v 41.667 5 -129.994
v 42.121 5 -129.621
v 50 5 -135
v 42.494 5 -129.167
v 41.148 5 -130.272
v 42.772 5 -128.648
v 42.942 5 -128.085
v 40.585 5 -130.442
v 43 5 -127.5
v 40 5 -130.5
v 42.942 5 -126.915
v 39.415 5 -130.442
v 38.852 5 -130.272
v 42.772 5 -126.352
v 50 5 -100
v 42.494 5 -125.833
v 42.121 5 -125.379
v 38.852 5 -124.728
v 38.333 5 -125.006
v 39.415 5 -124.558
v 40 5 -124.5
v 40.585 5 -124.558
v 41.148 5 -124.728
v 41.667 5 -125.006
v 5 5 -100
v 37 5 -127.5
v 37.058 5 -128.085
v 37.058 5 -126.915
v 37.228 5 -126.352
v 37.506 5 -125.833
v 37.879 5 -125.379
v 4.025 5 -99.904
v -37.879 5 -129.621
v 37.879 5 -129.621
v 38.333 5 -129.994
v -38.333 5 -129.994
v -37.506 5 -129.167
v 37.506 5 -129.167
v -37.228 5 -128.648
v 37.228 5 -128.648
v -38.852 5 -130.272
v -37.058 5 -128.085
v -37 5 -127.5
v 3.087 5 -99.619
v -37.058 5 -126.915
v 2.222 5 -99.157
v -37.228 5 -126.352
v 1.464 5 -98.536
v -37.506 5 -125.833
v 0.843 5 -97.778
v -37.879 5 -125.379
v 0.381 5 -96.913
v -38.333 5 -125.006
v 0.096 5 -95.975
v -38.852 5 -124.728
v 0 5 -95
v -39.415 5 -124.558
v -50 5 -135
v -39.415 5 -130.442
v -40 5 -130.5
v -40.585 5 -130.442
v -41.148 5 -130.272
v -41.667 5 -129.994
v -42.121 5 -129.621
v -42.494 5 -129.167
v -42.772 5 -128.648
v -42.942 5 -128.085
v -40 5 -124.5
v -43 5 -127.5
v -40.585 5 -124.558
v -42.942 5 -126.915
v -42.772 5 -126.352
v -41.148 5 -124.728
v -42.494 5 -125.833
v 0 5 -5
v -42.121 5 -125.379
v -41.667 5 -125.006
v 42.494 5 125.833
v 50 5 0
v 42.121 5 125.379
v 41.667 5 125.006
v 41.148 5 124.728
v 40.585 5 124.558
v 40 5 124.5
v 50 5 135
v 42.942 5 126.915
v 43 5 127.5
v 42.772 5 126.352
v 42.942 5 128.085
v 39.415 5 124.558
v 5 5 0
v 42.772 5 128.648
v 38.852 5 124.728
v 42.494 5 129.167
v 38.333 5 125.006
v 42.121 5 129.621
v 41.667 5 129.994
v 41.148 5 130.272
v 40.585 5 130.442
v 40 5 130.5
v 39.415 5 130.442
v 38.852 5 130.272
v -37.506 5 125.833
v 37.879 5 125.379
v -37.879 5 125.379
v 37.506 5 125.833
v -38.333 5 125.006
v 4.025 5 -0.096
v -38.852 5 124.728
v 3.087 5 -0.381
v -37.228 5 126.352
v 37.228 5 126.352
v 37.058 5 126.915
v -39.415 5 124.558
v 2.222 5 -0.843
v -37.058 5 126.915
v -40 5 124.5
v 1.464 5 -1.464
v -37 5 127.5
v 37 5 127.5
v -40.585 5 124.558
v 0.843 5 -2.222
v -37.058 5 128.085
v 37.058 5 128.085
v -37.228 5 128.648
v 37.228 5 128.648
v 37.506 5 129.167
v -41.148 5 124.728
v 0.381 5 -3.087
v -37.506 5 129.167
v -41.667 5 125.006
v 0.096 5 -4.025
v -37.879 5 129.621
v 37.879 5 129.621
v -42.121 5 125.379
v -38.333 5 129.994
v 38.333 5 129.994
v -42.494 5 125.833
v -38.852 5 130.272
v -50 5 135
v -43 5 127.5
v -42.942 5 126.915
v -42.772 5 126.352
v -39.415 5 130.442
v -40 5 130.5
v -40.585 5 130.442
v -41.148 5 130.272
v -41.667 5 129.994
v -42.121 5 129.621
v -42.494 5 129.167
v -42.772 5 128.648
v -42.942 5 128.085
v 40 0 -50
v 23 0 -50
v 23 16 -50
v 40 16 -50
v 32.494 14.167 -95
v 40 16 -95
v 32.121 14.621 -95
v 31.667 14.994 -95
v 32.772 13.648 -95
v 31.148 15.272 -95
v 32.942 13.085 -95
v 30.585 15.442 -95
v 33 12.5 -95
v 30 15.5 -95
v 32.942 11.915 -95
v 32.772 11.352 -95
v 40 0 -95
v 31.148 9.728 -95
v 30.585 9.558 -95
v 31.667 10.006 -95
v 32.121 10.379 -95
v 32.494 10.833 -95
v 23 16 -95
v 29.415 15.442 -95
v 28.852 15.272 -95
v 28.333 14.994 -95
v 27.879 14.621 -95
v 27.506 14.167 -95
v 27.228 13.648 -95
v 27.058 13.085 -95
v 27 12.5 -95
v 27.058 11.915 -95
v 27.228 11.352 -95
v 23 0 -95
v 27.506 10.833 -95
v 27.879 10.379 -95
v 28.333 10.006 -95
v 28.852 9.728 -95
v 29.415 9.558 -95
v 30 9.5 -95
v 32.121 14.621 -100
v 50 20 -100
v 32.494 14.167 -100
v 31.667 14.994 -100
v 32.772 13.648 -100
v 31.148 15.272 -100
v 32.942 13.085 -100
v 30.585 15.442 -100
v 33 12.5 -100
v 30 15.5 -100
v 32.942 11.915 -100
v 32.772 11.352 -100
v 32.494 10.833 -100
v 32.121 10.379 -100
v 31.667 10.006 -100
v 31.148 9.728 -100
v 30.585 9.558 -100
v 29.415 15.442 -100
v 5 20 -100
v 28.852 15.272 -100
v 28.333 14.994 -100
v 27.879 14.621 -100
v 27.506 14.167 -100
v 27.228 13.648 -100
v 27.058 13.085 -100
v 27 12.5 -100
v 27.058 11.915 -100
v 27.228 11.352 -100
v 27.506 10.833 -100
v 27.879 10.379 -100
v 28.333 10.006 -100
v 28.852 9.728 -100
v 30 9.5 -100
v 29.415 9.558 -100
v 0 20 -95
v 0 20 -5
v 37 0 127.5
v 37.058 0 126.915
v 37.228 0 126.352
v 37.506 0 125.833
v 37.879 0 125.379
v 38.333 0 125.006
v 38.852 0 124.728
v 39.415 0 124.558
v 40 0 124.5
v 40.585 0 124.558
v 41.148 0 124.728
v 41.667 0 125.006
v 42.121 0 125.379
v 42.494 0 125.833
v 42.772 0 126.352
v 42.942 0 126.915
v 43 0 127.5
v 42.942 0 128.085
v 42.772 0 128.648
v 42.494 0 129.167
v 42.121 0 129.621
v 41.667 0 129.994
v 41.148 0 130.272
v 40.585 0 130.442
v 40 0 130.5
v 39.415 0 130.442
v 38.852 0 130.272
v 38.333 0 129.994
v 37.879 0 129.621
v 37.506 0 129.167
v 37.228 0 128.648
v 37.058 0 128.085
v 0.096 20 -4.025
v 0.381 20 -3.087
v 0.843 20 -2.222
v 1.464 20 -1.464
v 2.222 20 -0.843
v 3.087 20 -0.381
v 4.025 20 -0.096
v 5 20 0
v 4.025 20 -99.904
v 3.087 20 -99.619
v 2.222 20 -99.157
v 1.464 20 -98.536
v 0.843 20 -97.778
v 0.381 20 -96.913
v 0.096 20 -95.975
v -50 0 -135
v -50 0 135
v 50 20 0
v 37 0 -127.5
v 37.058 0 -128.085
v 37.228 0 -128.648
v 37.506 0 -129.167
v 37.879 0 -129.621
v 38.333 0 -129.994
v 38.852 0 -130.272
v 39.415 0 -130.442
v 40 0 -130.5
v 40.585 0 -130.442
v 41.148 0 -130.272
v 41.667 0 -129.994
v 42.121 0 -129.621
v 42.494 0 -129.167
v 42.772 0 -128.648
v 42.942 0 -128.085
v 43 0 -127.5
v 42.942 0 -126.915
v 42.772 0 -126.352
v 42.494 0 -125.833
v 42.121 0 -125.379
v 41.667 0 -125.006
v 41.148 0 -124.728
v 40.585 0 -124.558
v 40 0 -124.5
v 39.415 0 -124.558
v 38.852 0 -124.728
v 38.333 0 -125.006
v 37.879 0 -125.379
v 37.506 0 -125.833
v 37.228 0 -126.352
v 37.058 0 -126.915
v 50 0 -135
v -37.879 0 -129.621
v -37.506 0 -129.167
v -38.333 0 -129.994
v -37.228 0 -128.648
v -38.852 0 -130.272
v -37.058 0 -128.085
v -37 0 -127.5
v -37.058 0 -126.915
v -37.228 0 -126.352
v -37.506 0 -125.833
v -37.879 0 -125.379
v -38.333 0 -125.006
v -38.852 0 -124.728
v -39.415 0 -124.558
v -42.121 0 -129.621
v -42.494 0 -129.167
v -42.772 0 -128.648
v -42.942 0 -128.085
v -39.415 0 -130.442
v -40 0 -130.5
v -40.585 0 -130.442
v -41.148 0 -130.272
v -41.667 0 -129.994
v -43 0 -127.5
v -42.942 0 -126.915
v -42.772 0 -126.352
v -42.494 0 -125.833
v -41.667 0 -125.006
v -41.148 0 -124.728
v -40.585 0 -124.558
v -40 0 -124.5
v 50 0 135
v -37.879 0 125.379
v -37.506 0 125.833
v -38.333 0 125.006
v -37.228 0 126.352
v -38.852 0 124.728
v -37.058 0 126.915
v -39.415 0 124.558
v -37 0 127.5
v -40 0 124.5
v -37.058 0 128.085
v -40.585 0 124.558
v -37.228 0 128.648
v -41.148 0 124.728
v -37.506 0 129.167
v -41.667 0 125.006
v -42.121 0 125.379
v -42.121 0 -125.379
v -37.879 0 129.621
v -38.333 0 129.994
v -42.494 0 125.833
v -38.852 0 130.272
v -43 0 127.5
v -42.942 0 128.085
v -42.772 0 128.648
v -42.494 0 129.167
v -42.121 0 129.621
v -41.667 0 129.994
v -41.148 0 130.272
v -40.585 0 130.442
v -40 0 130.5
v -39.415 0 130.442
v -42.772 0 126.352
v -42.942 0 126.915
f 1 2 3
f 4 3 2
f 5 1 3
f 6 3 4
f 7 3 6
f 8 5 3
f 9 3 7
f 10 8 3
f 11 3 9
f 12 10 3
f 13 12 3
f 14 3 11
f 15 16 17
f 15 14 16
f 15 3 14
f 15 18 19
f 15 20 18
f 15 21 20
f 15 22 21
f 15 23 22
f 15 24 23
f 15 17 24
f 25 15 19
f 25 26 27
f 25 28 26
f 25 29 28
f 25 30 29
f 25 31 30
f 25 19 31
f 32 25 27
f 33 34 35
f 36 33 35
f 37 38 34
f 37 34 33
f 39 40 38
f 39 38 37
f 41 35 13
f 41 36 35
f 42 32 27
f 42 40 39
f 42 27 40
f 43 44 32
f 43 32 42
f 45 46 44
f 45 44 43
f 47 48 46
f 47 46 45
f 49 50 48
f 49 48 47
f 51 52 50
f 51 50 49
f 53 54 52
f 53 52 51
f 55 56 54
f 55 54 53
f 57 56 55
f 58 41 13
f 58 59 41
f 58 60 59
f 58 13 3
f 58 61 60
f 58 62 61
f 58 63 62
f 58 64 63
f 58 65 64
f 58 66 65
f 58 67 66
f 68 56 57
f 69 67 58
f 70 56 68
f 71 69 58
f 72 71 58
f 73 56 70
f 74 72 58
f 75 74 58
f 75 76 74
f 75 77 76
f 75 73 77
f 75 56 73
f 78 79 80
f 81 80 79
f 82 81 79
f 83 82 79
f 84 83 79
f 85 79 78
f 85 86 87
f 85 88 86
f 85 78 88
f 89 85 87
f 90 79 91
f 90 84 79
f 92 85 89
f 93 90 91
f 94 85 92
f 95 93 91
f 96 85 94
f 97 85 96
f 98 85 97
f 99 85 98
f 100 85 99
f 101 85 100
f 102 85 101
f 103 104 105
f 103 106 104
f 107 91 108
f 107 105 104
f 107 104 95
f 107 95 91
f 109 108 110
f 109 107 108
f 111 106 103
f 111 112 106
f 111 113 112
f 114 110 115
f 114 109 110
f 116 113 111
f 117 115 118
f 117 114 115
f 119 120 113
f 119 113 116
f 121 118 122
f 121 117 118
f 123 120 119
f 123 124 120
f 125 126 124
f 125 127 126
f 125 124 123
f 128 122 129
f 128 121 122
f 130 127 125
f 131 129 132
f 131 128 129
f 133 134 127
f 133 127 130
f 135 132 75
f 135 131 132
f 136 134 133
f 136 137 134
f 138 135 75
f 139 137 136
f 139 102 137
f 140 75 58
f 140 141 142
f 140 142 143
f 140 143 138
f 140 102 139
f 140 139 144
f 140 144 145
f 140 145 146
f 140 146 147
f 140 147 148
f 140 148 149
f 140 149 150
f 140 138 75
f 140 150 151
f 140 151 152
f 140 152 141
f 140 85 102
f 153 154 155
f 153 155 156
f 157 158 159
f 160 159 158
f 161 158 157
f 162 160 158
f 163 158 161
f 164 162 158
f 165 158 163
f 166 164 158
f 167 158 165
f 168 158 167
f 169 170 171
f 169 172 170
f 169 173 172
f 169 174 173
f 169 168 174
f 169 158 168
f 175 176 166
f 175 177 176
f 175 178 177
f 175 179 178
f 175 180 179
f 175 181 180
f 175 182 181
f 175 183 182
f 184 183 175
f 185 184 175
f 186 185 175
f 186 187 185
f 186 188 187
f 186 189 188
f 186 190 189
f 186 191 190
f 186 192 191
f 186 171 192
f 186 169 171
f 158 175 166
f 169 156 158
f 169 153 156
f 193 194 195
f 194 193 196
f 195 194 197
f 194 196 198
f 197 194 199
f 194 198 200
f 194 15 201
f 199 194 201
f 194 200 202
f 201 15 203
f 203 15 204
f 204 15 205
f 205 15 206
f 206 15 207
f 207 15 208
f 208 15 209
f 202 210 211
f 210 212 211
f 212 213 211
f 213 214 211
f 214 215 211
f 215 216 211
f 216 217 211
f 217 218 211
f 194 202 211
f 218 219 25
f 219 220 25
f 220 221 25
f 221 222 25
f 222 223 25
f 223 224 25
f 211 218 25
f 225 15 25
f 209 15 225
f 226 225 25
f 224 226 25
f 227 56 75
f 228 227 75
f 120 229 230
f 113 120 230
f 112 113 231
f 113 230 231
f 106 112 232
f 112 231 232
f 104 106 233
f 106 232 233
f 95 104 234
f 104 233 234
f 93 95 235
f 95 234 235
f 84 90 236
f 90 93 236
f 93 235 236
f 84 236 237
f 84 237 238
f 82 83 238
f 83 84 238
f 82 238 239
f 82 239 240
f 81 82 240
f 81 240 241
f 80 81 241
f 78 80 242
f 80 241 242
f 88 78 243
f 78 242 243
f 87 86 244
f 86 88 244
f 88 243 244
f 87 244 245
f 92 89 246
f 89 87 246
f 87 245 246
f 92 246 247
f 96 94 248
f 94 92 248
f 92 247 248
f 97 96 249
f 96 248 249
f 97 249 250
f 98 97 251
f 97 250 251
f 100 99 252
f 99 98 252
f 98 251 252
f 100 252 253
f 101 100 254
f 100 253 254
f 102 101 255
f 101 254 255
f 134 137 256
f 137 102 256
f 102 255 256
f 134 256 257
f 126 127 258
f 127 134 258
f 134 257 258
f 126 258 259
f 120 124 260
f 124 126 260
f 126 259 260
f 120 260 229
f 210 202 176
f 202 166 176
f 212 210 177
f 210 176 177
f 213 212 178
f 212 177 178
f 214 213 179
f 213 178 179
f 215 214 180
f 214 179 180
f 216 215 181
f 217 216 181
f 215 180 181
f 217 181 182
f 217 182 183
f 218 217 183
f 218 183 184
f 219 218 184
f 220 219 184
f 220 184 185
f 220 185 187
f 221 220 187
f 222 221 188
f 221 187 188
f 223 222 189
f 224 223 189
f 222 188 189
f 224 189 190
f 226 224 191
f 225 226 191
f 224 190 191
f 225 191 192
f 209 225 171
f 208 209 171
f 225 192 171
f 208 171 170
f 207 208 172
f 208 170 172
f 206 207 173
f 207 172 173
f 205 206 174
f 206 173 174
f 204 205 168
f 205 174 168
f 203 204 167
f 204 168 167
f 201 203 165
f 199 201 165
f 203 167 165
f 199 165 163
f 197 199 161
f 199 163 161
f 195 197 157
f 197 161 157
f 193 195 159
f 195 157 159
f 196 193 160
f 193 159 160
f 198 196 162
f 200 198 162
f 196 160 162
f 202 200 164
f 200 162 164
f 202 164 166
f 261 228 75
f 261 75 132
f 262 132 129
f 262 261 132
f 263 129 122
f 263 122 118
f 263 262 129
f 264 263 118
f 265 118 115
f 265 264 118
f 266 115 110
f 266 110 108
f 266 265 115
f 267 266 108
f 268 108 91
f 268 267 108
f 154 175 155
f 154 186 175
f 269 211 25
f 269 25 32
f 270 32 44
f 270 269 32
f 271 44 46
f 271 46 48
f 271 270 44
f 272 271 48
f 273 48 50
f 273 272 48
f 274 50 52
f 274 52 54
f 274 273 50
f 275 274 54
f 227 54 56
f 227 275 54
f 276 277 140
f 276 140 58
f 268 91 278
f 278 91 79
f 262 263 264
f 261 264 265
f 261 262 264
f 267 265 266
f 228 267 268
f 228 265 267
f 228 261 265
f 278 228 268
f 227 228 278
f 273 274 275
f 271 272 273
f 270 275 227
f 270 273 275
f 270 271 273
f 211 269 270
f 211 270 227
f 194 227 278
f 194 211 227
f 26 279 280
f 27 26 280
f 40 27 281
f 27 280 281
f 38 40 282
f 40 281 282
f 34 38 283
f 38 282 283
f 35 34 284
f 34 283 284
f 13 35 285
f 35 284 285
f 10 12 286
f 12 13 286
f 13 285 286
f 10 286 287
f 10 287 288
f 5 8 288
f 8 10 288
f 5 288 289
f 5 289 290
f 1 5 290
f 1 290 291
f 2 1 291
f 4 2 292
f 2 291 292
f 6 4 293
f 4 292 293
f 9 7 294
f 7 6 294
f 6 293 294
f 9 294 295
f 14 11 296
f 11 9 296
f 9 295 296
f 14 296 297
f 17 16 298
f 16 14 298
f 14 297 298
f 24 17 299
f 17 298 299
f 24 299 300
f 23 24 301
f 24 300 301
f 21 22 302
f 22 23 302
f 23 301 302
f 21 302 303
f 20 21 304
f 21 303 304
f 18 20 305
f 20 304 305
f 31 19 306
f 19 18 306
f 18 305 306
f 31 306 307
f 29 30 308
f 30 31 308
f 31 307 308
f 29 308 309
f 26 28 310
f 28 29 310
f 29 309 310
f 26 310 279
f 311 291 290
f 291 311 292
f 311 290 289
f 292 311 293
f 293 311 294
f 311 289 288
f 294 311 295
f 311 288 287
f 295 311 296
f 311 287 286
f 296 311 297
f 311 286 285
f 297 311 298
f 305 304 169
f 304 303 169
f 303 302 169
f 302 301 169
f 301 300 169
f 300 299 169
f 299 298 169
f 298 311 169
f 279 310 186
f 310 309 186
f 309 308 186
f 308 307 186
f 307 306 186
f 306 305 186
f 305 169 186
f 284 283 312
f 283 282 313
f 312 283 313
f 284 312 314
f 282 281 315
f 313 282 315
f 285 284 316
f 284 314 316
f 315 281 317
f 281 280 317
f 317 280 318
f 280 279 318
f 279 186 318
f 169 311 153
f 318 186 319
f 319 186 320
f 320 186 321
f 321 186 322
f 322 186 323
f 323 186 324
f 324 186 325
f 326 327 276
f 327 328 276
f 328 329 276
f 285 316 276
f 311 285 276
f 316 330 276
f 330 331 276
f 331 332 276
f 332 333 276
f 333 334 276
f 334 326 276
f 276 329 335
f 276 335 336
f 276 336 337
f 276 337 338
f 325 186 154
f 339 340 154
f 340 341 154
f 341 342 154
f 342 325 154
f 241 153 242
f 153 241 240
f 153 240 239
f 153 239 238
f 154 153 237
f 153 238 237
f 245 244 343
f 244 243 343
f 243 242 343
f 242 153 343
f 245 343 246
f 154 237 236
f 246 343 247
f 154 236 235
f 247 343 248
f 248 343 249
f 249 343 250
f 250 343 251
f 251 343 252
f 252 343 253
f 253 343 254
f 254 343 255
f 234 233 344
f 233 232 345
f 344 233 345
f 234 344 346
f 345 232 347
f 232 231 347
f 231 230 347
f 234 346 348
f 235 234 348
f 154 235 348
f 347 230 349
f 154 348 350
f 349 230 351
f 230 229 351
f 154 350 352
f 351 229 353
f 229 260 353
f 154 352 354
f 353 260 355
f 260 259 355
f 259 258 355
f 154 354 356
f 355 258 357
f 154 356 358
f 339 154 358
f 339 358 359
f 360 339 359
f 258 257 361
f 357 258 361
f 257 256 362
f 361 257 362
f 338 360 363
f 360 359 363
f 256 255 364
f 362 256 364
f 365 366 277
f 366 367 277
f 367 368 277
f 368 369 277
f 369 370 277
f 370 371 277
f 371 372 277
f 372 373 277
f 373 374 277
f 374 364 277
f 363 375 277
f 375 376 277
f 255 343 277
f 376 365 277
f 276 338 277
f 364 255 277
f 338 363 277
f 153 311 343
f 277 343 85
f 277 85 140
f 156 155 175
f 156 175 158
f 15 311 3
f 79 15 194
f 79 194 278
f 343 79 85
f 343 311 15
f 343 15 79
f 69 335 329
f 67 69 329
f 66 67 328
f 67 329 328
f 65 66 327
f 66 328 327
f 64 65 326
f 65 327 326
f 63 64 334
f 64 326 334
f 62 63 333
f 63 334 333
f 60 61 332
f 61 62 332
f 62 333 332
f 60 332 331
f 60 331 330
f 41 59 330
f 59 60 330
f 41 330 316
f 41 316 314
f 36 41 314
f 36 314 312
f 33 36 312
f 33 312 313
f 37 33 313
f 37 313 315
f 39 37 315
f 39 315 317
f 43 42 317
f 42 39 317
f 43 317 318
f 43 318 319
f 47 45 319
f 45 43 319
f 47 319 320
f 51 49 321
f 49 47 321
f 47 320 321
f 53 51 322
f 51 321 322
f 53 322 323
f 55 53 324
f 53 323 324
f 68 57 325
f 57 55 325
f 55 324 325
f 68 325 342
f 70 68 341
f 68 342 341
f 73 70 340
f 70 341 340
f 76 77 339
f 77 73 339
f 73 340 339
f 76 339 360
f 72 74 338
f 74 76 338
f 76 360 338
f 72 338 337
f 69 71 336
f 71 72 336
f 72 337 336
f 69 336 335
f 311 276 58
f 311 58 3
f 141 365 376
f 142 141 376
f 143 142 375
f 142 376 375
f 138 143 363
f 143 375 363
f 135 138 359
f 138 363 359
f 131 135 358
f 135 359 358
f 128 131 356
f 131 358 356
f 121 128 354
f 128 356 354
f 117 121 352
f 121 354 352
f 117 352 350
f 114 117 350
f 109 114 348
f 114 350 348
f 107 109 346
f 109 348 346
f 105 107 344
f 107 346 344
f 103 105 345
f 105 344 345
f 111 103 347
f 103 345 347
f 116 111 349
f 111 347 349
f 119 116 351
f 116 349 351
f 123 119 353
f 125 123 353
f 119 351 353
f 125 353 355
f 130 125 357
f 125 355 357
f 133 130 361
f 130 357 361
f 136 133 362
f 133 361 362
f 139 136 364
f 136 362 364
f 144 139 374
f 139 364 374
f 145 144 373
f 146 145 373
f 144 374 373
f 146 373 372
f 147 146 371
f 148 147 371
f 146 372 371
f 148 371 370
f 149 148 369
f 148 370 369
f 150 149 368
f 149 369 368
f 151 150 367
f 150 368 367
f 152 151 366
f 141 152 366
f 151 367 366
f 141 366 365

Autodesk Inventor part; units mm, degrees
ref_plane "YZ Plane" through (0, 0, 0) normal (1, 0, 0) x (0, 1, 0)
ref_plane "XZ Plane" through (0, 0, 0) normal (0, 1, 0) x (-1, 0, 0)
ref_plane "XY Plane" through (0, 0, 0) normal (0, 0, 1) x (1, 0, 0)
sketch "Sketch1" plane through (0, 0, 0) normal (0, 1, 0) x (-1, 0, 0)
  line L0 (0, 0) -> (0, 135)
  line L1 (0, 135) -> (0, -135)
  line L2 (0, -135) -> (50, -135)
  line L3 (50, -135) -> (-50, -135)
  line L4 (-50, -135) -> (-50, 135)
  line L5 (-50, 135) -> (50, 135)
  line L6 (50, 135) -> (50, -135)
  line L7 (50, 135) -> (50, 127.5)
  line L8 (50, 127.5) -> (40, 127.5)
  circle A0 centre (40, 127.5) radius 3
  line L9 (40, 127.5) -> (-40, 127.5)
  circle A1 centre (-40, 127.5) radius 3
  line L10 (50, 0) -> (-50, 0)
  circle A2 centre (40, -127.5) radius 3
  circle A3 centre (-40, -127.5) radius 3
  dimension "d0" = 135
  dimension "d1" = 270
  dimension "d2" = 50
  dimension "d3" = 100
  dimension "d4" = 7.5
  dimension "d5" = 10
  dimension "d6" = 6
  dimension "d7" = 80
  dimension "d8" = 6
extrude "Extrusion1" add sketch "Sketch1" along normal blind 5 contours L10 L4 L5 L0 | L10 L6 L2 L1 | L0 L9 A0 L8 L6 L10 | L1 L3 L4 L10 | L0 L5 L6 L8 A0 L9
sketch "Sketch2" plane through (0, 5, 0) normal (0, 1, 0) x (1, 0, 0)
  line L0 (0, 0) -> (50, 0)
  line L1 (50, -135) -> (50, 135) projected
  line L2 (50, 0) -> (50, 100)
  line L3 (50, 100) -> (0, 100)
  line L4 (0, 100) -> (0, 0)
  dimension "d11" = 100
extrude "Extrusion2" add sketch "Sketch2" along normal blind 15
fillet "Fillet1" radius 5 1 edges at (0, 12.5, -100)
fillet "Fillet2" radius 5 1 edges at (0, 12.5, 0)
sketch "Sketch3" plane through (50, 5, -100) normal (0, 0, -1) x (-1, 0, 0)
  line L0 (0, 0) -> (0, 15) projected
  line L1 (0, 0) -> (0, 7.5)
  line L2 (0, 7.5) -> (20, 7.5)
  circle A0 centre (20, 7.5) radius 2.5
  point P0 (50, -5)
  dimension "d16" = 7.5
  dimension "d17" = 20
  dimension "d18" = 5
hole "Hole1" at (30, 12.5, -100) direction (0, 0, 1) diameter 6 depth 20 tip angle 118
sketch "Sketch4" plane through (0, 0, 0) normal (0, -1, 0) x (1, 0, 0)
  line L0 (50, -135) -> (-50, -135) projected
  line L1 (50, -135) -> (33, -135)
  line L2 (33, -135) -> (33, -100)
  line L3 (5, -100) -> (50, -100) projected
  line L4 (33, -100) -> (40, -100)
  line L5 (40, -100) -> (23, -100)
  line L6 (23, -100) -> (23, -50)
  line L7 (23, -50) -> (40, -50)
  line L8 (40, -50) -> (40, -100)
  line L9 (40, -100) -> (40, -95)
  line L10 (40, -95) -> (23, -95)
  line L11 (23, -95) -> (23, -100)
  point P0 (0, 0)
  dimension "d26" = 17
  dimension "d27" = 35
  dimension "d28" = 7
  dimension "d29" = 17
  dimension "d30" = 50
  dimension "d31" = 5
extrude "Extrusion3" cut sketch "Sketch4" against normal blind 16 contours L6 L7 L8 L10
properties part number "side_front"
